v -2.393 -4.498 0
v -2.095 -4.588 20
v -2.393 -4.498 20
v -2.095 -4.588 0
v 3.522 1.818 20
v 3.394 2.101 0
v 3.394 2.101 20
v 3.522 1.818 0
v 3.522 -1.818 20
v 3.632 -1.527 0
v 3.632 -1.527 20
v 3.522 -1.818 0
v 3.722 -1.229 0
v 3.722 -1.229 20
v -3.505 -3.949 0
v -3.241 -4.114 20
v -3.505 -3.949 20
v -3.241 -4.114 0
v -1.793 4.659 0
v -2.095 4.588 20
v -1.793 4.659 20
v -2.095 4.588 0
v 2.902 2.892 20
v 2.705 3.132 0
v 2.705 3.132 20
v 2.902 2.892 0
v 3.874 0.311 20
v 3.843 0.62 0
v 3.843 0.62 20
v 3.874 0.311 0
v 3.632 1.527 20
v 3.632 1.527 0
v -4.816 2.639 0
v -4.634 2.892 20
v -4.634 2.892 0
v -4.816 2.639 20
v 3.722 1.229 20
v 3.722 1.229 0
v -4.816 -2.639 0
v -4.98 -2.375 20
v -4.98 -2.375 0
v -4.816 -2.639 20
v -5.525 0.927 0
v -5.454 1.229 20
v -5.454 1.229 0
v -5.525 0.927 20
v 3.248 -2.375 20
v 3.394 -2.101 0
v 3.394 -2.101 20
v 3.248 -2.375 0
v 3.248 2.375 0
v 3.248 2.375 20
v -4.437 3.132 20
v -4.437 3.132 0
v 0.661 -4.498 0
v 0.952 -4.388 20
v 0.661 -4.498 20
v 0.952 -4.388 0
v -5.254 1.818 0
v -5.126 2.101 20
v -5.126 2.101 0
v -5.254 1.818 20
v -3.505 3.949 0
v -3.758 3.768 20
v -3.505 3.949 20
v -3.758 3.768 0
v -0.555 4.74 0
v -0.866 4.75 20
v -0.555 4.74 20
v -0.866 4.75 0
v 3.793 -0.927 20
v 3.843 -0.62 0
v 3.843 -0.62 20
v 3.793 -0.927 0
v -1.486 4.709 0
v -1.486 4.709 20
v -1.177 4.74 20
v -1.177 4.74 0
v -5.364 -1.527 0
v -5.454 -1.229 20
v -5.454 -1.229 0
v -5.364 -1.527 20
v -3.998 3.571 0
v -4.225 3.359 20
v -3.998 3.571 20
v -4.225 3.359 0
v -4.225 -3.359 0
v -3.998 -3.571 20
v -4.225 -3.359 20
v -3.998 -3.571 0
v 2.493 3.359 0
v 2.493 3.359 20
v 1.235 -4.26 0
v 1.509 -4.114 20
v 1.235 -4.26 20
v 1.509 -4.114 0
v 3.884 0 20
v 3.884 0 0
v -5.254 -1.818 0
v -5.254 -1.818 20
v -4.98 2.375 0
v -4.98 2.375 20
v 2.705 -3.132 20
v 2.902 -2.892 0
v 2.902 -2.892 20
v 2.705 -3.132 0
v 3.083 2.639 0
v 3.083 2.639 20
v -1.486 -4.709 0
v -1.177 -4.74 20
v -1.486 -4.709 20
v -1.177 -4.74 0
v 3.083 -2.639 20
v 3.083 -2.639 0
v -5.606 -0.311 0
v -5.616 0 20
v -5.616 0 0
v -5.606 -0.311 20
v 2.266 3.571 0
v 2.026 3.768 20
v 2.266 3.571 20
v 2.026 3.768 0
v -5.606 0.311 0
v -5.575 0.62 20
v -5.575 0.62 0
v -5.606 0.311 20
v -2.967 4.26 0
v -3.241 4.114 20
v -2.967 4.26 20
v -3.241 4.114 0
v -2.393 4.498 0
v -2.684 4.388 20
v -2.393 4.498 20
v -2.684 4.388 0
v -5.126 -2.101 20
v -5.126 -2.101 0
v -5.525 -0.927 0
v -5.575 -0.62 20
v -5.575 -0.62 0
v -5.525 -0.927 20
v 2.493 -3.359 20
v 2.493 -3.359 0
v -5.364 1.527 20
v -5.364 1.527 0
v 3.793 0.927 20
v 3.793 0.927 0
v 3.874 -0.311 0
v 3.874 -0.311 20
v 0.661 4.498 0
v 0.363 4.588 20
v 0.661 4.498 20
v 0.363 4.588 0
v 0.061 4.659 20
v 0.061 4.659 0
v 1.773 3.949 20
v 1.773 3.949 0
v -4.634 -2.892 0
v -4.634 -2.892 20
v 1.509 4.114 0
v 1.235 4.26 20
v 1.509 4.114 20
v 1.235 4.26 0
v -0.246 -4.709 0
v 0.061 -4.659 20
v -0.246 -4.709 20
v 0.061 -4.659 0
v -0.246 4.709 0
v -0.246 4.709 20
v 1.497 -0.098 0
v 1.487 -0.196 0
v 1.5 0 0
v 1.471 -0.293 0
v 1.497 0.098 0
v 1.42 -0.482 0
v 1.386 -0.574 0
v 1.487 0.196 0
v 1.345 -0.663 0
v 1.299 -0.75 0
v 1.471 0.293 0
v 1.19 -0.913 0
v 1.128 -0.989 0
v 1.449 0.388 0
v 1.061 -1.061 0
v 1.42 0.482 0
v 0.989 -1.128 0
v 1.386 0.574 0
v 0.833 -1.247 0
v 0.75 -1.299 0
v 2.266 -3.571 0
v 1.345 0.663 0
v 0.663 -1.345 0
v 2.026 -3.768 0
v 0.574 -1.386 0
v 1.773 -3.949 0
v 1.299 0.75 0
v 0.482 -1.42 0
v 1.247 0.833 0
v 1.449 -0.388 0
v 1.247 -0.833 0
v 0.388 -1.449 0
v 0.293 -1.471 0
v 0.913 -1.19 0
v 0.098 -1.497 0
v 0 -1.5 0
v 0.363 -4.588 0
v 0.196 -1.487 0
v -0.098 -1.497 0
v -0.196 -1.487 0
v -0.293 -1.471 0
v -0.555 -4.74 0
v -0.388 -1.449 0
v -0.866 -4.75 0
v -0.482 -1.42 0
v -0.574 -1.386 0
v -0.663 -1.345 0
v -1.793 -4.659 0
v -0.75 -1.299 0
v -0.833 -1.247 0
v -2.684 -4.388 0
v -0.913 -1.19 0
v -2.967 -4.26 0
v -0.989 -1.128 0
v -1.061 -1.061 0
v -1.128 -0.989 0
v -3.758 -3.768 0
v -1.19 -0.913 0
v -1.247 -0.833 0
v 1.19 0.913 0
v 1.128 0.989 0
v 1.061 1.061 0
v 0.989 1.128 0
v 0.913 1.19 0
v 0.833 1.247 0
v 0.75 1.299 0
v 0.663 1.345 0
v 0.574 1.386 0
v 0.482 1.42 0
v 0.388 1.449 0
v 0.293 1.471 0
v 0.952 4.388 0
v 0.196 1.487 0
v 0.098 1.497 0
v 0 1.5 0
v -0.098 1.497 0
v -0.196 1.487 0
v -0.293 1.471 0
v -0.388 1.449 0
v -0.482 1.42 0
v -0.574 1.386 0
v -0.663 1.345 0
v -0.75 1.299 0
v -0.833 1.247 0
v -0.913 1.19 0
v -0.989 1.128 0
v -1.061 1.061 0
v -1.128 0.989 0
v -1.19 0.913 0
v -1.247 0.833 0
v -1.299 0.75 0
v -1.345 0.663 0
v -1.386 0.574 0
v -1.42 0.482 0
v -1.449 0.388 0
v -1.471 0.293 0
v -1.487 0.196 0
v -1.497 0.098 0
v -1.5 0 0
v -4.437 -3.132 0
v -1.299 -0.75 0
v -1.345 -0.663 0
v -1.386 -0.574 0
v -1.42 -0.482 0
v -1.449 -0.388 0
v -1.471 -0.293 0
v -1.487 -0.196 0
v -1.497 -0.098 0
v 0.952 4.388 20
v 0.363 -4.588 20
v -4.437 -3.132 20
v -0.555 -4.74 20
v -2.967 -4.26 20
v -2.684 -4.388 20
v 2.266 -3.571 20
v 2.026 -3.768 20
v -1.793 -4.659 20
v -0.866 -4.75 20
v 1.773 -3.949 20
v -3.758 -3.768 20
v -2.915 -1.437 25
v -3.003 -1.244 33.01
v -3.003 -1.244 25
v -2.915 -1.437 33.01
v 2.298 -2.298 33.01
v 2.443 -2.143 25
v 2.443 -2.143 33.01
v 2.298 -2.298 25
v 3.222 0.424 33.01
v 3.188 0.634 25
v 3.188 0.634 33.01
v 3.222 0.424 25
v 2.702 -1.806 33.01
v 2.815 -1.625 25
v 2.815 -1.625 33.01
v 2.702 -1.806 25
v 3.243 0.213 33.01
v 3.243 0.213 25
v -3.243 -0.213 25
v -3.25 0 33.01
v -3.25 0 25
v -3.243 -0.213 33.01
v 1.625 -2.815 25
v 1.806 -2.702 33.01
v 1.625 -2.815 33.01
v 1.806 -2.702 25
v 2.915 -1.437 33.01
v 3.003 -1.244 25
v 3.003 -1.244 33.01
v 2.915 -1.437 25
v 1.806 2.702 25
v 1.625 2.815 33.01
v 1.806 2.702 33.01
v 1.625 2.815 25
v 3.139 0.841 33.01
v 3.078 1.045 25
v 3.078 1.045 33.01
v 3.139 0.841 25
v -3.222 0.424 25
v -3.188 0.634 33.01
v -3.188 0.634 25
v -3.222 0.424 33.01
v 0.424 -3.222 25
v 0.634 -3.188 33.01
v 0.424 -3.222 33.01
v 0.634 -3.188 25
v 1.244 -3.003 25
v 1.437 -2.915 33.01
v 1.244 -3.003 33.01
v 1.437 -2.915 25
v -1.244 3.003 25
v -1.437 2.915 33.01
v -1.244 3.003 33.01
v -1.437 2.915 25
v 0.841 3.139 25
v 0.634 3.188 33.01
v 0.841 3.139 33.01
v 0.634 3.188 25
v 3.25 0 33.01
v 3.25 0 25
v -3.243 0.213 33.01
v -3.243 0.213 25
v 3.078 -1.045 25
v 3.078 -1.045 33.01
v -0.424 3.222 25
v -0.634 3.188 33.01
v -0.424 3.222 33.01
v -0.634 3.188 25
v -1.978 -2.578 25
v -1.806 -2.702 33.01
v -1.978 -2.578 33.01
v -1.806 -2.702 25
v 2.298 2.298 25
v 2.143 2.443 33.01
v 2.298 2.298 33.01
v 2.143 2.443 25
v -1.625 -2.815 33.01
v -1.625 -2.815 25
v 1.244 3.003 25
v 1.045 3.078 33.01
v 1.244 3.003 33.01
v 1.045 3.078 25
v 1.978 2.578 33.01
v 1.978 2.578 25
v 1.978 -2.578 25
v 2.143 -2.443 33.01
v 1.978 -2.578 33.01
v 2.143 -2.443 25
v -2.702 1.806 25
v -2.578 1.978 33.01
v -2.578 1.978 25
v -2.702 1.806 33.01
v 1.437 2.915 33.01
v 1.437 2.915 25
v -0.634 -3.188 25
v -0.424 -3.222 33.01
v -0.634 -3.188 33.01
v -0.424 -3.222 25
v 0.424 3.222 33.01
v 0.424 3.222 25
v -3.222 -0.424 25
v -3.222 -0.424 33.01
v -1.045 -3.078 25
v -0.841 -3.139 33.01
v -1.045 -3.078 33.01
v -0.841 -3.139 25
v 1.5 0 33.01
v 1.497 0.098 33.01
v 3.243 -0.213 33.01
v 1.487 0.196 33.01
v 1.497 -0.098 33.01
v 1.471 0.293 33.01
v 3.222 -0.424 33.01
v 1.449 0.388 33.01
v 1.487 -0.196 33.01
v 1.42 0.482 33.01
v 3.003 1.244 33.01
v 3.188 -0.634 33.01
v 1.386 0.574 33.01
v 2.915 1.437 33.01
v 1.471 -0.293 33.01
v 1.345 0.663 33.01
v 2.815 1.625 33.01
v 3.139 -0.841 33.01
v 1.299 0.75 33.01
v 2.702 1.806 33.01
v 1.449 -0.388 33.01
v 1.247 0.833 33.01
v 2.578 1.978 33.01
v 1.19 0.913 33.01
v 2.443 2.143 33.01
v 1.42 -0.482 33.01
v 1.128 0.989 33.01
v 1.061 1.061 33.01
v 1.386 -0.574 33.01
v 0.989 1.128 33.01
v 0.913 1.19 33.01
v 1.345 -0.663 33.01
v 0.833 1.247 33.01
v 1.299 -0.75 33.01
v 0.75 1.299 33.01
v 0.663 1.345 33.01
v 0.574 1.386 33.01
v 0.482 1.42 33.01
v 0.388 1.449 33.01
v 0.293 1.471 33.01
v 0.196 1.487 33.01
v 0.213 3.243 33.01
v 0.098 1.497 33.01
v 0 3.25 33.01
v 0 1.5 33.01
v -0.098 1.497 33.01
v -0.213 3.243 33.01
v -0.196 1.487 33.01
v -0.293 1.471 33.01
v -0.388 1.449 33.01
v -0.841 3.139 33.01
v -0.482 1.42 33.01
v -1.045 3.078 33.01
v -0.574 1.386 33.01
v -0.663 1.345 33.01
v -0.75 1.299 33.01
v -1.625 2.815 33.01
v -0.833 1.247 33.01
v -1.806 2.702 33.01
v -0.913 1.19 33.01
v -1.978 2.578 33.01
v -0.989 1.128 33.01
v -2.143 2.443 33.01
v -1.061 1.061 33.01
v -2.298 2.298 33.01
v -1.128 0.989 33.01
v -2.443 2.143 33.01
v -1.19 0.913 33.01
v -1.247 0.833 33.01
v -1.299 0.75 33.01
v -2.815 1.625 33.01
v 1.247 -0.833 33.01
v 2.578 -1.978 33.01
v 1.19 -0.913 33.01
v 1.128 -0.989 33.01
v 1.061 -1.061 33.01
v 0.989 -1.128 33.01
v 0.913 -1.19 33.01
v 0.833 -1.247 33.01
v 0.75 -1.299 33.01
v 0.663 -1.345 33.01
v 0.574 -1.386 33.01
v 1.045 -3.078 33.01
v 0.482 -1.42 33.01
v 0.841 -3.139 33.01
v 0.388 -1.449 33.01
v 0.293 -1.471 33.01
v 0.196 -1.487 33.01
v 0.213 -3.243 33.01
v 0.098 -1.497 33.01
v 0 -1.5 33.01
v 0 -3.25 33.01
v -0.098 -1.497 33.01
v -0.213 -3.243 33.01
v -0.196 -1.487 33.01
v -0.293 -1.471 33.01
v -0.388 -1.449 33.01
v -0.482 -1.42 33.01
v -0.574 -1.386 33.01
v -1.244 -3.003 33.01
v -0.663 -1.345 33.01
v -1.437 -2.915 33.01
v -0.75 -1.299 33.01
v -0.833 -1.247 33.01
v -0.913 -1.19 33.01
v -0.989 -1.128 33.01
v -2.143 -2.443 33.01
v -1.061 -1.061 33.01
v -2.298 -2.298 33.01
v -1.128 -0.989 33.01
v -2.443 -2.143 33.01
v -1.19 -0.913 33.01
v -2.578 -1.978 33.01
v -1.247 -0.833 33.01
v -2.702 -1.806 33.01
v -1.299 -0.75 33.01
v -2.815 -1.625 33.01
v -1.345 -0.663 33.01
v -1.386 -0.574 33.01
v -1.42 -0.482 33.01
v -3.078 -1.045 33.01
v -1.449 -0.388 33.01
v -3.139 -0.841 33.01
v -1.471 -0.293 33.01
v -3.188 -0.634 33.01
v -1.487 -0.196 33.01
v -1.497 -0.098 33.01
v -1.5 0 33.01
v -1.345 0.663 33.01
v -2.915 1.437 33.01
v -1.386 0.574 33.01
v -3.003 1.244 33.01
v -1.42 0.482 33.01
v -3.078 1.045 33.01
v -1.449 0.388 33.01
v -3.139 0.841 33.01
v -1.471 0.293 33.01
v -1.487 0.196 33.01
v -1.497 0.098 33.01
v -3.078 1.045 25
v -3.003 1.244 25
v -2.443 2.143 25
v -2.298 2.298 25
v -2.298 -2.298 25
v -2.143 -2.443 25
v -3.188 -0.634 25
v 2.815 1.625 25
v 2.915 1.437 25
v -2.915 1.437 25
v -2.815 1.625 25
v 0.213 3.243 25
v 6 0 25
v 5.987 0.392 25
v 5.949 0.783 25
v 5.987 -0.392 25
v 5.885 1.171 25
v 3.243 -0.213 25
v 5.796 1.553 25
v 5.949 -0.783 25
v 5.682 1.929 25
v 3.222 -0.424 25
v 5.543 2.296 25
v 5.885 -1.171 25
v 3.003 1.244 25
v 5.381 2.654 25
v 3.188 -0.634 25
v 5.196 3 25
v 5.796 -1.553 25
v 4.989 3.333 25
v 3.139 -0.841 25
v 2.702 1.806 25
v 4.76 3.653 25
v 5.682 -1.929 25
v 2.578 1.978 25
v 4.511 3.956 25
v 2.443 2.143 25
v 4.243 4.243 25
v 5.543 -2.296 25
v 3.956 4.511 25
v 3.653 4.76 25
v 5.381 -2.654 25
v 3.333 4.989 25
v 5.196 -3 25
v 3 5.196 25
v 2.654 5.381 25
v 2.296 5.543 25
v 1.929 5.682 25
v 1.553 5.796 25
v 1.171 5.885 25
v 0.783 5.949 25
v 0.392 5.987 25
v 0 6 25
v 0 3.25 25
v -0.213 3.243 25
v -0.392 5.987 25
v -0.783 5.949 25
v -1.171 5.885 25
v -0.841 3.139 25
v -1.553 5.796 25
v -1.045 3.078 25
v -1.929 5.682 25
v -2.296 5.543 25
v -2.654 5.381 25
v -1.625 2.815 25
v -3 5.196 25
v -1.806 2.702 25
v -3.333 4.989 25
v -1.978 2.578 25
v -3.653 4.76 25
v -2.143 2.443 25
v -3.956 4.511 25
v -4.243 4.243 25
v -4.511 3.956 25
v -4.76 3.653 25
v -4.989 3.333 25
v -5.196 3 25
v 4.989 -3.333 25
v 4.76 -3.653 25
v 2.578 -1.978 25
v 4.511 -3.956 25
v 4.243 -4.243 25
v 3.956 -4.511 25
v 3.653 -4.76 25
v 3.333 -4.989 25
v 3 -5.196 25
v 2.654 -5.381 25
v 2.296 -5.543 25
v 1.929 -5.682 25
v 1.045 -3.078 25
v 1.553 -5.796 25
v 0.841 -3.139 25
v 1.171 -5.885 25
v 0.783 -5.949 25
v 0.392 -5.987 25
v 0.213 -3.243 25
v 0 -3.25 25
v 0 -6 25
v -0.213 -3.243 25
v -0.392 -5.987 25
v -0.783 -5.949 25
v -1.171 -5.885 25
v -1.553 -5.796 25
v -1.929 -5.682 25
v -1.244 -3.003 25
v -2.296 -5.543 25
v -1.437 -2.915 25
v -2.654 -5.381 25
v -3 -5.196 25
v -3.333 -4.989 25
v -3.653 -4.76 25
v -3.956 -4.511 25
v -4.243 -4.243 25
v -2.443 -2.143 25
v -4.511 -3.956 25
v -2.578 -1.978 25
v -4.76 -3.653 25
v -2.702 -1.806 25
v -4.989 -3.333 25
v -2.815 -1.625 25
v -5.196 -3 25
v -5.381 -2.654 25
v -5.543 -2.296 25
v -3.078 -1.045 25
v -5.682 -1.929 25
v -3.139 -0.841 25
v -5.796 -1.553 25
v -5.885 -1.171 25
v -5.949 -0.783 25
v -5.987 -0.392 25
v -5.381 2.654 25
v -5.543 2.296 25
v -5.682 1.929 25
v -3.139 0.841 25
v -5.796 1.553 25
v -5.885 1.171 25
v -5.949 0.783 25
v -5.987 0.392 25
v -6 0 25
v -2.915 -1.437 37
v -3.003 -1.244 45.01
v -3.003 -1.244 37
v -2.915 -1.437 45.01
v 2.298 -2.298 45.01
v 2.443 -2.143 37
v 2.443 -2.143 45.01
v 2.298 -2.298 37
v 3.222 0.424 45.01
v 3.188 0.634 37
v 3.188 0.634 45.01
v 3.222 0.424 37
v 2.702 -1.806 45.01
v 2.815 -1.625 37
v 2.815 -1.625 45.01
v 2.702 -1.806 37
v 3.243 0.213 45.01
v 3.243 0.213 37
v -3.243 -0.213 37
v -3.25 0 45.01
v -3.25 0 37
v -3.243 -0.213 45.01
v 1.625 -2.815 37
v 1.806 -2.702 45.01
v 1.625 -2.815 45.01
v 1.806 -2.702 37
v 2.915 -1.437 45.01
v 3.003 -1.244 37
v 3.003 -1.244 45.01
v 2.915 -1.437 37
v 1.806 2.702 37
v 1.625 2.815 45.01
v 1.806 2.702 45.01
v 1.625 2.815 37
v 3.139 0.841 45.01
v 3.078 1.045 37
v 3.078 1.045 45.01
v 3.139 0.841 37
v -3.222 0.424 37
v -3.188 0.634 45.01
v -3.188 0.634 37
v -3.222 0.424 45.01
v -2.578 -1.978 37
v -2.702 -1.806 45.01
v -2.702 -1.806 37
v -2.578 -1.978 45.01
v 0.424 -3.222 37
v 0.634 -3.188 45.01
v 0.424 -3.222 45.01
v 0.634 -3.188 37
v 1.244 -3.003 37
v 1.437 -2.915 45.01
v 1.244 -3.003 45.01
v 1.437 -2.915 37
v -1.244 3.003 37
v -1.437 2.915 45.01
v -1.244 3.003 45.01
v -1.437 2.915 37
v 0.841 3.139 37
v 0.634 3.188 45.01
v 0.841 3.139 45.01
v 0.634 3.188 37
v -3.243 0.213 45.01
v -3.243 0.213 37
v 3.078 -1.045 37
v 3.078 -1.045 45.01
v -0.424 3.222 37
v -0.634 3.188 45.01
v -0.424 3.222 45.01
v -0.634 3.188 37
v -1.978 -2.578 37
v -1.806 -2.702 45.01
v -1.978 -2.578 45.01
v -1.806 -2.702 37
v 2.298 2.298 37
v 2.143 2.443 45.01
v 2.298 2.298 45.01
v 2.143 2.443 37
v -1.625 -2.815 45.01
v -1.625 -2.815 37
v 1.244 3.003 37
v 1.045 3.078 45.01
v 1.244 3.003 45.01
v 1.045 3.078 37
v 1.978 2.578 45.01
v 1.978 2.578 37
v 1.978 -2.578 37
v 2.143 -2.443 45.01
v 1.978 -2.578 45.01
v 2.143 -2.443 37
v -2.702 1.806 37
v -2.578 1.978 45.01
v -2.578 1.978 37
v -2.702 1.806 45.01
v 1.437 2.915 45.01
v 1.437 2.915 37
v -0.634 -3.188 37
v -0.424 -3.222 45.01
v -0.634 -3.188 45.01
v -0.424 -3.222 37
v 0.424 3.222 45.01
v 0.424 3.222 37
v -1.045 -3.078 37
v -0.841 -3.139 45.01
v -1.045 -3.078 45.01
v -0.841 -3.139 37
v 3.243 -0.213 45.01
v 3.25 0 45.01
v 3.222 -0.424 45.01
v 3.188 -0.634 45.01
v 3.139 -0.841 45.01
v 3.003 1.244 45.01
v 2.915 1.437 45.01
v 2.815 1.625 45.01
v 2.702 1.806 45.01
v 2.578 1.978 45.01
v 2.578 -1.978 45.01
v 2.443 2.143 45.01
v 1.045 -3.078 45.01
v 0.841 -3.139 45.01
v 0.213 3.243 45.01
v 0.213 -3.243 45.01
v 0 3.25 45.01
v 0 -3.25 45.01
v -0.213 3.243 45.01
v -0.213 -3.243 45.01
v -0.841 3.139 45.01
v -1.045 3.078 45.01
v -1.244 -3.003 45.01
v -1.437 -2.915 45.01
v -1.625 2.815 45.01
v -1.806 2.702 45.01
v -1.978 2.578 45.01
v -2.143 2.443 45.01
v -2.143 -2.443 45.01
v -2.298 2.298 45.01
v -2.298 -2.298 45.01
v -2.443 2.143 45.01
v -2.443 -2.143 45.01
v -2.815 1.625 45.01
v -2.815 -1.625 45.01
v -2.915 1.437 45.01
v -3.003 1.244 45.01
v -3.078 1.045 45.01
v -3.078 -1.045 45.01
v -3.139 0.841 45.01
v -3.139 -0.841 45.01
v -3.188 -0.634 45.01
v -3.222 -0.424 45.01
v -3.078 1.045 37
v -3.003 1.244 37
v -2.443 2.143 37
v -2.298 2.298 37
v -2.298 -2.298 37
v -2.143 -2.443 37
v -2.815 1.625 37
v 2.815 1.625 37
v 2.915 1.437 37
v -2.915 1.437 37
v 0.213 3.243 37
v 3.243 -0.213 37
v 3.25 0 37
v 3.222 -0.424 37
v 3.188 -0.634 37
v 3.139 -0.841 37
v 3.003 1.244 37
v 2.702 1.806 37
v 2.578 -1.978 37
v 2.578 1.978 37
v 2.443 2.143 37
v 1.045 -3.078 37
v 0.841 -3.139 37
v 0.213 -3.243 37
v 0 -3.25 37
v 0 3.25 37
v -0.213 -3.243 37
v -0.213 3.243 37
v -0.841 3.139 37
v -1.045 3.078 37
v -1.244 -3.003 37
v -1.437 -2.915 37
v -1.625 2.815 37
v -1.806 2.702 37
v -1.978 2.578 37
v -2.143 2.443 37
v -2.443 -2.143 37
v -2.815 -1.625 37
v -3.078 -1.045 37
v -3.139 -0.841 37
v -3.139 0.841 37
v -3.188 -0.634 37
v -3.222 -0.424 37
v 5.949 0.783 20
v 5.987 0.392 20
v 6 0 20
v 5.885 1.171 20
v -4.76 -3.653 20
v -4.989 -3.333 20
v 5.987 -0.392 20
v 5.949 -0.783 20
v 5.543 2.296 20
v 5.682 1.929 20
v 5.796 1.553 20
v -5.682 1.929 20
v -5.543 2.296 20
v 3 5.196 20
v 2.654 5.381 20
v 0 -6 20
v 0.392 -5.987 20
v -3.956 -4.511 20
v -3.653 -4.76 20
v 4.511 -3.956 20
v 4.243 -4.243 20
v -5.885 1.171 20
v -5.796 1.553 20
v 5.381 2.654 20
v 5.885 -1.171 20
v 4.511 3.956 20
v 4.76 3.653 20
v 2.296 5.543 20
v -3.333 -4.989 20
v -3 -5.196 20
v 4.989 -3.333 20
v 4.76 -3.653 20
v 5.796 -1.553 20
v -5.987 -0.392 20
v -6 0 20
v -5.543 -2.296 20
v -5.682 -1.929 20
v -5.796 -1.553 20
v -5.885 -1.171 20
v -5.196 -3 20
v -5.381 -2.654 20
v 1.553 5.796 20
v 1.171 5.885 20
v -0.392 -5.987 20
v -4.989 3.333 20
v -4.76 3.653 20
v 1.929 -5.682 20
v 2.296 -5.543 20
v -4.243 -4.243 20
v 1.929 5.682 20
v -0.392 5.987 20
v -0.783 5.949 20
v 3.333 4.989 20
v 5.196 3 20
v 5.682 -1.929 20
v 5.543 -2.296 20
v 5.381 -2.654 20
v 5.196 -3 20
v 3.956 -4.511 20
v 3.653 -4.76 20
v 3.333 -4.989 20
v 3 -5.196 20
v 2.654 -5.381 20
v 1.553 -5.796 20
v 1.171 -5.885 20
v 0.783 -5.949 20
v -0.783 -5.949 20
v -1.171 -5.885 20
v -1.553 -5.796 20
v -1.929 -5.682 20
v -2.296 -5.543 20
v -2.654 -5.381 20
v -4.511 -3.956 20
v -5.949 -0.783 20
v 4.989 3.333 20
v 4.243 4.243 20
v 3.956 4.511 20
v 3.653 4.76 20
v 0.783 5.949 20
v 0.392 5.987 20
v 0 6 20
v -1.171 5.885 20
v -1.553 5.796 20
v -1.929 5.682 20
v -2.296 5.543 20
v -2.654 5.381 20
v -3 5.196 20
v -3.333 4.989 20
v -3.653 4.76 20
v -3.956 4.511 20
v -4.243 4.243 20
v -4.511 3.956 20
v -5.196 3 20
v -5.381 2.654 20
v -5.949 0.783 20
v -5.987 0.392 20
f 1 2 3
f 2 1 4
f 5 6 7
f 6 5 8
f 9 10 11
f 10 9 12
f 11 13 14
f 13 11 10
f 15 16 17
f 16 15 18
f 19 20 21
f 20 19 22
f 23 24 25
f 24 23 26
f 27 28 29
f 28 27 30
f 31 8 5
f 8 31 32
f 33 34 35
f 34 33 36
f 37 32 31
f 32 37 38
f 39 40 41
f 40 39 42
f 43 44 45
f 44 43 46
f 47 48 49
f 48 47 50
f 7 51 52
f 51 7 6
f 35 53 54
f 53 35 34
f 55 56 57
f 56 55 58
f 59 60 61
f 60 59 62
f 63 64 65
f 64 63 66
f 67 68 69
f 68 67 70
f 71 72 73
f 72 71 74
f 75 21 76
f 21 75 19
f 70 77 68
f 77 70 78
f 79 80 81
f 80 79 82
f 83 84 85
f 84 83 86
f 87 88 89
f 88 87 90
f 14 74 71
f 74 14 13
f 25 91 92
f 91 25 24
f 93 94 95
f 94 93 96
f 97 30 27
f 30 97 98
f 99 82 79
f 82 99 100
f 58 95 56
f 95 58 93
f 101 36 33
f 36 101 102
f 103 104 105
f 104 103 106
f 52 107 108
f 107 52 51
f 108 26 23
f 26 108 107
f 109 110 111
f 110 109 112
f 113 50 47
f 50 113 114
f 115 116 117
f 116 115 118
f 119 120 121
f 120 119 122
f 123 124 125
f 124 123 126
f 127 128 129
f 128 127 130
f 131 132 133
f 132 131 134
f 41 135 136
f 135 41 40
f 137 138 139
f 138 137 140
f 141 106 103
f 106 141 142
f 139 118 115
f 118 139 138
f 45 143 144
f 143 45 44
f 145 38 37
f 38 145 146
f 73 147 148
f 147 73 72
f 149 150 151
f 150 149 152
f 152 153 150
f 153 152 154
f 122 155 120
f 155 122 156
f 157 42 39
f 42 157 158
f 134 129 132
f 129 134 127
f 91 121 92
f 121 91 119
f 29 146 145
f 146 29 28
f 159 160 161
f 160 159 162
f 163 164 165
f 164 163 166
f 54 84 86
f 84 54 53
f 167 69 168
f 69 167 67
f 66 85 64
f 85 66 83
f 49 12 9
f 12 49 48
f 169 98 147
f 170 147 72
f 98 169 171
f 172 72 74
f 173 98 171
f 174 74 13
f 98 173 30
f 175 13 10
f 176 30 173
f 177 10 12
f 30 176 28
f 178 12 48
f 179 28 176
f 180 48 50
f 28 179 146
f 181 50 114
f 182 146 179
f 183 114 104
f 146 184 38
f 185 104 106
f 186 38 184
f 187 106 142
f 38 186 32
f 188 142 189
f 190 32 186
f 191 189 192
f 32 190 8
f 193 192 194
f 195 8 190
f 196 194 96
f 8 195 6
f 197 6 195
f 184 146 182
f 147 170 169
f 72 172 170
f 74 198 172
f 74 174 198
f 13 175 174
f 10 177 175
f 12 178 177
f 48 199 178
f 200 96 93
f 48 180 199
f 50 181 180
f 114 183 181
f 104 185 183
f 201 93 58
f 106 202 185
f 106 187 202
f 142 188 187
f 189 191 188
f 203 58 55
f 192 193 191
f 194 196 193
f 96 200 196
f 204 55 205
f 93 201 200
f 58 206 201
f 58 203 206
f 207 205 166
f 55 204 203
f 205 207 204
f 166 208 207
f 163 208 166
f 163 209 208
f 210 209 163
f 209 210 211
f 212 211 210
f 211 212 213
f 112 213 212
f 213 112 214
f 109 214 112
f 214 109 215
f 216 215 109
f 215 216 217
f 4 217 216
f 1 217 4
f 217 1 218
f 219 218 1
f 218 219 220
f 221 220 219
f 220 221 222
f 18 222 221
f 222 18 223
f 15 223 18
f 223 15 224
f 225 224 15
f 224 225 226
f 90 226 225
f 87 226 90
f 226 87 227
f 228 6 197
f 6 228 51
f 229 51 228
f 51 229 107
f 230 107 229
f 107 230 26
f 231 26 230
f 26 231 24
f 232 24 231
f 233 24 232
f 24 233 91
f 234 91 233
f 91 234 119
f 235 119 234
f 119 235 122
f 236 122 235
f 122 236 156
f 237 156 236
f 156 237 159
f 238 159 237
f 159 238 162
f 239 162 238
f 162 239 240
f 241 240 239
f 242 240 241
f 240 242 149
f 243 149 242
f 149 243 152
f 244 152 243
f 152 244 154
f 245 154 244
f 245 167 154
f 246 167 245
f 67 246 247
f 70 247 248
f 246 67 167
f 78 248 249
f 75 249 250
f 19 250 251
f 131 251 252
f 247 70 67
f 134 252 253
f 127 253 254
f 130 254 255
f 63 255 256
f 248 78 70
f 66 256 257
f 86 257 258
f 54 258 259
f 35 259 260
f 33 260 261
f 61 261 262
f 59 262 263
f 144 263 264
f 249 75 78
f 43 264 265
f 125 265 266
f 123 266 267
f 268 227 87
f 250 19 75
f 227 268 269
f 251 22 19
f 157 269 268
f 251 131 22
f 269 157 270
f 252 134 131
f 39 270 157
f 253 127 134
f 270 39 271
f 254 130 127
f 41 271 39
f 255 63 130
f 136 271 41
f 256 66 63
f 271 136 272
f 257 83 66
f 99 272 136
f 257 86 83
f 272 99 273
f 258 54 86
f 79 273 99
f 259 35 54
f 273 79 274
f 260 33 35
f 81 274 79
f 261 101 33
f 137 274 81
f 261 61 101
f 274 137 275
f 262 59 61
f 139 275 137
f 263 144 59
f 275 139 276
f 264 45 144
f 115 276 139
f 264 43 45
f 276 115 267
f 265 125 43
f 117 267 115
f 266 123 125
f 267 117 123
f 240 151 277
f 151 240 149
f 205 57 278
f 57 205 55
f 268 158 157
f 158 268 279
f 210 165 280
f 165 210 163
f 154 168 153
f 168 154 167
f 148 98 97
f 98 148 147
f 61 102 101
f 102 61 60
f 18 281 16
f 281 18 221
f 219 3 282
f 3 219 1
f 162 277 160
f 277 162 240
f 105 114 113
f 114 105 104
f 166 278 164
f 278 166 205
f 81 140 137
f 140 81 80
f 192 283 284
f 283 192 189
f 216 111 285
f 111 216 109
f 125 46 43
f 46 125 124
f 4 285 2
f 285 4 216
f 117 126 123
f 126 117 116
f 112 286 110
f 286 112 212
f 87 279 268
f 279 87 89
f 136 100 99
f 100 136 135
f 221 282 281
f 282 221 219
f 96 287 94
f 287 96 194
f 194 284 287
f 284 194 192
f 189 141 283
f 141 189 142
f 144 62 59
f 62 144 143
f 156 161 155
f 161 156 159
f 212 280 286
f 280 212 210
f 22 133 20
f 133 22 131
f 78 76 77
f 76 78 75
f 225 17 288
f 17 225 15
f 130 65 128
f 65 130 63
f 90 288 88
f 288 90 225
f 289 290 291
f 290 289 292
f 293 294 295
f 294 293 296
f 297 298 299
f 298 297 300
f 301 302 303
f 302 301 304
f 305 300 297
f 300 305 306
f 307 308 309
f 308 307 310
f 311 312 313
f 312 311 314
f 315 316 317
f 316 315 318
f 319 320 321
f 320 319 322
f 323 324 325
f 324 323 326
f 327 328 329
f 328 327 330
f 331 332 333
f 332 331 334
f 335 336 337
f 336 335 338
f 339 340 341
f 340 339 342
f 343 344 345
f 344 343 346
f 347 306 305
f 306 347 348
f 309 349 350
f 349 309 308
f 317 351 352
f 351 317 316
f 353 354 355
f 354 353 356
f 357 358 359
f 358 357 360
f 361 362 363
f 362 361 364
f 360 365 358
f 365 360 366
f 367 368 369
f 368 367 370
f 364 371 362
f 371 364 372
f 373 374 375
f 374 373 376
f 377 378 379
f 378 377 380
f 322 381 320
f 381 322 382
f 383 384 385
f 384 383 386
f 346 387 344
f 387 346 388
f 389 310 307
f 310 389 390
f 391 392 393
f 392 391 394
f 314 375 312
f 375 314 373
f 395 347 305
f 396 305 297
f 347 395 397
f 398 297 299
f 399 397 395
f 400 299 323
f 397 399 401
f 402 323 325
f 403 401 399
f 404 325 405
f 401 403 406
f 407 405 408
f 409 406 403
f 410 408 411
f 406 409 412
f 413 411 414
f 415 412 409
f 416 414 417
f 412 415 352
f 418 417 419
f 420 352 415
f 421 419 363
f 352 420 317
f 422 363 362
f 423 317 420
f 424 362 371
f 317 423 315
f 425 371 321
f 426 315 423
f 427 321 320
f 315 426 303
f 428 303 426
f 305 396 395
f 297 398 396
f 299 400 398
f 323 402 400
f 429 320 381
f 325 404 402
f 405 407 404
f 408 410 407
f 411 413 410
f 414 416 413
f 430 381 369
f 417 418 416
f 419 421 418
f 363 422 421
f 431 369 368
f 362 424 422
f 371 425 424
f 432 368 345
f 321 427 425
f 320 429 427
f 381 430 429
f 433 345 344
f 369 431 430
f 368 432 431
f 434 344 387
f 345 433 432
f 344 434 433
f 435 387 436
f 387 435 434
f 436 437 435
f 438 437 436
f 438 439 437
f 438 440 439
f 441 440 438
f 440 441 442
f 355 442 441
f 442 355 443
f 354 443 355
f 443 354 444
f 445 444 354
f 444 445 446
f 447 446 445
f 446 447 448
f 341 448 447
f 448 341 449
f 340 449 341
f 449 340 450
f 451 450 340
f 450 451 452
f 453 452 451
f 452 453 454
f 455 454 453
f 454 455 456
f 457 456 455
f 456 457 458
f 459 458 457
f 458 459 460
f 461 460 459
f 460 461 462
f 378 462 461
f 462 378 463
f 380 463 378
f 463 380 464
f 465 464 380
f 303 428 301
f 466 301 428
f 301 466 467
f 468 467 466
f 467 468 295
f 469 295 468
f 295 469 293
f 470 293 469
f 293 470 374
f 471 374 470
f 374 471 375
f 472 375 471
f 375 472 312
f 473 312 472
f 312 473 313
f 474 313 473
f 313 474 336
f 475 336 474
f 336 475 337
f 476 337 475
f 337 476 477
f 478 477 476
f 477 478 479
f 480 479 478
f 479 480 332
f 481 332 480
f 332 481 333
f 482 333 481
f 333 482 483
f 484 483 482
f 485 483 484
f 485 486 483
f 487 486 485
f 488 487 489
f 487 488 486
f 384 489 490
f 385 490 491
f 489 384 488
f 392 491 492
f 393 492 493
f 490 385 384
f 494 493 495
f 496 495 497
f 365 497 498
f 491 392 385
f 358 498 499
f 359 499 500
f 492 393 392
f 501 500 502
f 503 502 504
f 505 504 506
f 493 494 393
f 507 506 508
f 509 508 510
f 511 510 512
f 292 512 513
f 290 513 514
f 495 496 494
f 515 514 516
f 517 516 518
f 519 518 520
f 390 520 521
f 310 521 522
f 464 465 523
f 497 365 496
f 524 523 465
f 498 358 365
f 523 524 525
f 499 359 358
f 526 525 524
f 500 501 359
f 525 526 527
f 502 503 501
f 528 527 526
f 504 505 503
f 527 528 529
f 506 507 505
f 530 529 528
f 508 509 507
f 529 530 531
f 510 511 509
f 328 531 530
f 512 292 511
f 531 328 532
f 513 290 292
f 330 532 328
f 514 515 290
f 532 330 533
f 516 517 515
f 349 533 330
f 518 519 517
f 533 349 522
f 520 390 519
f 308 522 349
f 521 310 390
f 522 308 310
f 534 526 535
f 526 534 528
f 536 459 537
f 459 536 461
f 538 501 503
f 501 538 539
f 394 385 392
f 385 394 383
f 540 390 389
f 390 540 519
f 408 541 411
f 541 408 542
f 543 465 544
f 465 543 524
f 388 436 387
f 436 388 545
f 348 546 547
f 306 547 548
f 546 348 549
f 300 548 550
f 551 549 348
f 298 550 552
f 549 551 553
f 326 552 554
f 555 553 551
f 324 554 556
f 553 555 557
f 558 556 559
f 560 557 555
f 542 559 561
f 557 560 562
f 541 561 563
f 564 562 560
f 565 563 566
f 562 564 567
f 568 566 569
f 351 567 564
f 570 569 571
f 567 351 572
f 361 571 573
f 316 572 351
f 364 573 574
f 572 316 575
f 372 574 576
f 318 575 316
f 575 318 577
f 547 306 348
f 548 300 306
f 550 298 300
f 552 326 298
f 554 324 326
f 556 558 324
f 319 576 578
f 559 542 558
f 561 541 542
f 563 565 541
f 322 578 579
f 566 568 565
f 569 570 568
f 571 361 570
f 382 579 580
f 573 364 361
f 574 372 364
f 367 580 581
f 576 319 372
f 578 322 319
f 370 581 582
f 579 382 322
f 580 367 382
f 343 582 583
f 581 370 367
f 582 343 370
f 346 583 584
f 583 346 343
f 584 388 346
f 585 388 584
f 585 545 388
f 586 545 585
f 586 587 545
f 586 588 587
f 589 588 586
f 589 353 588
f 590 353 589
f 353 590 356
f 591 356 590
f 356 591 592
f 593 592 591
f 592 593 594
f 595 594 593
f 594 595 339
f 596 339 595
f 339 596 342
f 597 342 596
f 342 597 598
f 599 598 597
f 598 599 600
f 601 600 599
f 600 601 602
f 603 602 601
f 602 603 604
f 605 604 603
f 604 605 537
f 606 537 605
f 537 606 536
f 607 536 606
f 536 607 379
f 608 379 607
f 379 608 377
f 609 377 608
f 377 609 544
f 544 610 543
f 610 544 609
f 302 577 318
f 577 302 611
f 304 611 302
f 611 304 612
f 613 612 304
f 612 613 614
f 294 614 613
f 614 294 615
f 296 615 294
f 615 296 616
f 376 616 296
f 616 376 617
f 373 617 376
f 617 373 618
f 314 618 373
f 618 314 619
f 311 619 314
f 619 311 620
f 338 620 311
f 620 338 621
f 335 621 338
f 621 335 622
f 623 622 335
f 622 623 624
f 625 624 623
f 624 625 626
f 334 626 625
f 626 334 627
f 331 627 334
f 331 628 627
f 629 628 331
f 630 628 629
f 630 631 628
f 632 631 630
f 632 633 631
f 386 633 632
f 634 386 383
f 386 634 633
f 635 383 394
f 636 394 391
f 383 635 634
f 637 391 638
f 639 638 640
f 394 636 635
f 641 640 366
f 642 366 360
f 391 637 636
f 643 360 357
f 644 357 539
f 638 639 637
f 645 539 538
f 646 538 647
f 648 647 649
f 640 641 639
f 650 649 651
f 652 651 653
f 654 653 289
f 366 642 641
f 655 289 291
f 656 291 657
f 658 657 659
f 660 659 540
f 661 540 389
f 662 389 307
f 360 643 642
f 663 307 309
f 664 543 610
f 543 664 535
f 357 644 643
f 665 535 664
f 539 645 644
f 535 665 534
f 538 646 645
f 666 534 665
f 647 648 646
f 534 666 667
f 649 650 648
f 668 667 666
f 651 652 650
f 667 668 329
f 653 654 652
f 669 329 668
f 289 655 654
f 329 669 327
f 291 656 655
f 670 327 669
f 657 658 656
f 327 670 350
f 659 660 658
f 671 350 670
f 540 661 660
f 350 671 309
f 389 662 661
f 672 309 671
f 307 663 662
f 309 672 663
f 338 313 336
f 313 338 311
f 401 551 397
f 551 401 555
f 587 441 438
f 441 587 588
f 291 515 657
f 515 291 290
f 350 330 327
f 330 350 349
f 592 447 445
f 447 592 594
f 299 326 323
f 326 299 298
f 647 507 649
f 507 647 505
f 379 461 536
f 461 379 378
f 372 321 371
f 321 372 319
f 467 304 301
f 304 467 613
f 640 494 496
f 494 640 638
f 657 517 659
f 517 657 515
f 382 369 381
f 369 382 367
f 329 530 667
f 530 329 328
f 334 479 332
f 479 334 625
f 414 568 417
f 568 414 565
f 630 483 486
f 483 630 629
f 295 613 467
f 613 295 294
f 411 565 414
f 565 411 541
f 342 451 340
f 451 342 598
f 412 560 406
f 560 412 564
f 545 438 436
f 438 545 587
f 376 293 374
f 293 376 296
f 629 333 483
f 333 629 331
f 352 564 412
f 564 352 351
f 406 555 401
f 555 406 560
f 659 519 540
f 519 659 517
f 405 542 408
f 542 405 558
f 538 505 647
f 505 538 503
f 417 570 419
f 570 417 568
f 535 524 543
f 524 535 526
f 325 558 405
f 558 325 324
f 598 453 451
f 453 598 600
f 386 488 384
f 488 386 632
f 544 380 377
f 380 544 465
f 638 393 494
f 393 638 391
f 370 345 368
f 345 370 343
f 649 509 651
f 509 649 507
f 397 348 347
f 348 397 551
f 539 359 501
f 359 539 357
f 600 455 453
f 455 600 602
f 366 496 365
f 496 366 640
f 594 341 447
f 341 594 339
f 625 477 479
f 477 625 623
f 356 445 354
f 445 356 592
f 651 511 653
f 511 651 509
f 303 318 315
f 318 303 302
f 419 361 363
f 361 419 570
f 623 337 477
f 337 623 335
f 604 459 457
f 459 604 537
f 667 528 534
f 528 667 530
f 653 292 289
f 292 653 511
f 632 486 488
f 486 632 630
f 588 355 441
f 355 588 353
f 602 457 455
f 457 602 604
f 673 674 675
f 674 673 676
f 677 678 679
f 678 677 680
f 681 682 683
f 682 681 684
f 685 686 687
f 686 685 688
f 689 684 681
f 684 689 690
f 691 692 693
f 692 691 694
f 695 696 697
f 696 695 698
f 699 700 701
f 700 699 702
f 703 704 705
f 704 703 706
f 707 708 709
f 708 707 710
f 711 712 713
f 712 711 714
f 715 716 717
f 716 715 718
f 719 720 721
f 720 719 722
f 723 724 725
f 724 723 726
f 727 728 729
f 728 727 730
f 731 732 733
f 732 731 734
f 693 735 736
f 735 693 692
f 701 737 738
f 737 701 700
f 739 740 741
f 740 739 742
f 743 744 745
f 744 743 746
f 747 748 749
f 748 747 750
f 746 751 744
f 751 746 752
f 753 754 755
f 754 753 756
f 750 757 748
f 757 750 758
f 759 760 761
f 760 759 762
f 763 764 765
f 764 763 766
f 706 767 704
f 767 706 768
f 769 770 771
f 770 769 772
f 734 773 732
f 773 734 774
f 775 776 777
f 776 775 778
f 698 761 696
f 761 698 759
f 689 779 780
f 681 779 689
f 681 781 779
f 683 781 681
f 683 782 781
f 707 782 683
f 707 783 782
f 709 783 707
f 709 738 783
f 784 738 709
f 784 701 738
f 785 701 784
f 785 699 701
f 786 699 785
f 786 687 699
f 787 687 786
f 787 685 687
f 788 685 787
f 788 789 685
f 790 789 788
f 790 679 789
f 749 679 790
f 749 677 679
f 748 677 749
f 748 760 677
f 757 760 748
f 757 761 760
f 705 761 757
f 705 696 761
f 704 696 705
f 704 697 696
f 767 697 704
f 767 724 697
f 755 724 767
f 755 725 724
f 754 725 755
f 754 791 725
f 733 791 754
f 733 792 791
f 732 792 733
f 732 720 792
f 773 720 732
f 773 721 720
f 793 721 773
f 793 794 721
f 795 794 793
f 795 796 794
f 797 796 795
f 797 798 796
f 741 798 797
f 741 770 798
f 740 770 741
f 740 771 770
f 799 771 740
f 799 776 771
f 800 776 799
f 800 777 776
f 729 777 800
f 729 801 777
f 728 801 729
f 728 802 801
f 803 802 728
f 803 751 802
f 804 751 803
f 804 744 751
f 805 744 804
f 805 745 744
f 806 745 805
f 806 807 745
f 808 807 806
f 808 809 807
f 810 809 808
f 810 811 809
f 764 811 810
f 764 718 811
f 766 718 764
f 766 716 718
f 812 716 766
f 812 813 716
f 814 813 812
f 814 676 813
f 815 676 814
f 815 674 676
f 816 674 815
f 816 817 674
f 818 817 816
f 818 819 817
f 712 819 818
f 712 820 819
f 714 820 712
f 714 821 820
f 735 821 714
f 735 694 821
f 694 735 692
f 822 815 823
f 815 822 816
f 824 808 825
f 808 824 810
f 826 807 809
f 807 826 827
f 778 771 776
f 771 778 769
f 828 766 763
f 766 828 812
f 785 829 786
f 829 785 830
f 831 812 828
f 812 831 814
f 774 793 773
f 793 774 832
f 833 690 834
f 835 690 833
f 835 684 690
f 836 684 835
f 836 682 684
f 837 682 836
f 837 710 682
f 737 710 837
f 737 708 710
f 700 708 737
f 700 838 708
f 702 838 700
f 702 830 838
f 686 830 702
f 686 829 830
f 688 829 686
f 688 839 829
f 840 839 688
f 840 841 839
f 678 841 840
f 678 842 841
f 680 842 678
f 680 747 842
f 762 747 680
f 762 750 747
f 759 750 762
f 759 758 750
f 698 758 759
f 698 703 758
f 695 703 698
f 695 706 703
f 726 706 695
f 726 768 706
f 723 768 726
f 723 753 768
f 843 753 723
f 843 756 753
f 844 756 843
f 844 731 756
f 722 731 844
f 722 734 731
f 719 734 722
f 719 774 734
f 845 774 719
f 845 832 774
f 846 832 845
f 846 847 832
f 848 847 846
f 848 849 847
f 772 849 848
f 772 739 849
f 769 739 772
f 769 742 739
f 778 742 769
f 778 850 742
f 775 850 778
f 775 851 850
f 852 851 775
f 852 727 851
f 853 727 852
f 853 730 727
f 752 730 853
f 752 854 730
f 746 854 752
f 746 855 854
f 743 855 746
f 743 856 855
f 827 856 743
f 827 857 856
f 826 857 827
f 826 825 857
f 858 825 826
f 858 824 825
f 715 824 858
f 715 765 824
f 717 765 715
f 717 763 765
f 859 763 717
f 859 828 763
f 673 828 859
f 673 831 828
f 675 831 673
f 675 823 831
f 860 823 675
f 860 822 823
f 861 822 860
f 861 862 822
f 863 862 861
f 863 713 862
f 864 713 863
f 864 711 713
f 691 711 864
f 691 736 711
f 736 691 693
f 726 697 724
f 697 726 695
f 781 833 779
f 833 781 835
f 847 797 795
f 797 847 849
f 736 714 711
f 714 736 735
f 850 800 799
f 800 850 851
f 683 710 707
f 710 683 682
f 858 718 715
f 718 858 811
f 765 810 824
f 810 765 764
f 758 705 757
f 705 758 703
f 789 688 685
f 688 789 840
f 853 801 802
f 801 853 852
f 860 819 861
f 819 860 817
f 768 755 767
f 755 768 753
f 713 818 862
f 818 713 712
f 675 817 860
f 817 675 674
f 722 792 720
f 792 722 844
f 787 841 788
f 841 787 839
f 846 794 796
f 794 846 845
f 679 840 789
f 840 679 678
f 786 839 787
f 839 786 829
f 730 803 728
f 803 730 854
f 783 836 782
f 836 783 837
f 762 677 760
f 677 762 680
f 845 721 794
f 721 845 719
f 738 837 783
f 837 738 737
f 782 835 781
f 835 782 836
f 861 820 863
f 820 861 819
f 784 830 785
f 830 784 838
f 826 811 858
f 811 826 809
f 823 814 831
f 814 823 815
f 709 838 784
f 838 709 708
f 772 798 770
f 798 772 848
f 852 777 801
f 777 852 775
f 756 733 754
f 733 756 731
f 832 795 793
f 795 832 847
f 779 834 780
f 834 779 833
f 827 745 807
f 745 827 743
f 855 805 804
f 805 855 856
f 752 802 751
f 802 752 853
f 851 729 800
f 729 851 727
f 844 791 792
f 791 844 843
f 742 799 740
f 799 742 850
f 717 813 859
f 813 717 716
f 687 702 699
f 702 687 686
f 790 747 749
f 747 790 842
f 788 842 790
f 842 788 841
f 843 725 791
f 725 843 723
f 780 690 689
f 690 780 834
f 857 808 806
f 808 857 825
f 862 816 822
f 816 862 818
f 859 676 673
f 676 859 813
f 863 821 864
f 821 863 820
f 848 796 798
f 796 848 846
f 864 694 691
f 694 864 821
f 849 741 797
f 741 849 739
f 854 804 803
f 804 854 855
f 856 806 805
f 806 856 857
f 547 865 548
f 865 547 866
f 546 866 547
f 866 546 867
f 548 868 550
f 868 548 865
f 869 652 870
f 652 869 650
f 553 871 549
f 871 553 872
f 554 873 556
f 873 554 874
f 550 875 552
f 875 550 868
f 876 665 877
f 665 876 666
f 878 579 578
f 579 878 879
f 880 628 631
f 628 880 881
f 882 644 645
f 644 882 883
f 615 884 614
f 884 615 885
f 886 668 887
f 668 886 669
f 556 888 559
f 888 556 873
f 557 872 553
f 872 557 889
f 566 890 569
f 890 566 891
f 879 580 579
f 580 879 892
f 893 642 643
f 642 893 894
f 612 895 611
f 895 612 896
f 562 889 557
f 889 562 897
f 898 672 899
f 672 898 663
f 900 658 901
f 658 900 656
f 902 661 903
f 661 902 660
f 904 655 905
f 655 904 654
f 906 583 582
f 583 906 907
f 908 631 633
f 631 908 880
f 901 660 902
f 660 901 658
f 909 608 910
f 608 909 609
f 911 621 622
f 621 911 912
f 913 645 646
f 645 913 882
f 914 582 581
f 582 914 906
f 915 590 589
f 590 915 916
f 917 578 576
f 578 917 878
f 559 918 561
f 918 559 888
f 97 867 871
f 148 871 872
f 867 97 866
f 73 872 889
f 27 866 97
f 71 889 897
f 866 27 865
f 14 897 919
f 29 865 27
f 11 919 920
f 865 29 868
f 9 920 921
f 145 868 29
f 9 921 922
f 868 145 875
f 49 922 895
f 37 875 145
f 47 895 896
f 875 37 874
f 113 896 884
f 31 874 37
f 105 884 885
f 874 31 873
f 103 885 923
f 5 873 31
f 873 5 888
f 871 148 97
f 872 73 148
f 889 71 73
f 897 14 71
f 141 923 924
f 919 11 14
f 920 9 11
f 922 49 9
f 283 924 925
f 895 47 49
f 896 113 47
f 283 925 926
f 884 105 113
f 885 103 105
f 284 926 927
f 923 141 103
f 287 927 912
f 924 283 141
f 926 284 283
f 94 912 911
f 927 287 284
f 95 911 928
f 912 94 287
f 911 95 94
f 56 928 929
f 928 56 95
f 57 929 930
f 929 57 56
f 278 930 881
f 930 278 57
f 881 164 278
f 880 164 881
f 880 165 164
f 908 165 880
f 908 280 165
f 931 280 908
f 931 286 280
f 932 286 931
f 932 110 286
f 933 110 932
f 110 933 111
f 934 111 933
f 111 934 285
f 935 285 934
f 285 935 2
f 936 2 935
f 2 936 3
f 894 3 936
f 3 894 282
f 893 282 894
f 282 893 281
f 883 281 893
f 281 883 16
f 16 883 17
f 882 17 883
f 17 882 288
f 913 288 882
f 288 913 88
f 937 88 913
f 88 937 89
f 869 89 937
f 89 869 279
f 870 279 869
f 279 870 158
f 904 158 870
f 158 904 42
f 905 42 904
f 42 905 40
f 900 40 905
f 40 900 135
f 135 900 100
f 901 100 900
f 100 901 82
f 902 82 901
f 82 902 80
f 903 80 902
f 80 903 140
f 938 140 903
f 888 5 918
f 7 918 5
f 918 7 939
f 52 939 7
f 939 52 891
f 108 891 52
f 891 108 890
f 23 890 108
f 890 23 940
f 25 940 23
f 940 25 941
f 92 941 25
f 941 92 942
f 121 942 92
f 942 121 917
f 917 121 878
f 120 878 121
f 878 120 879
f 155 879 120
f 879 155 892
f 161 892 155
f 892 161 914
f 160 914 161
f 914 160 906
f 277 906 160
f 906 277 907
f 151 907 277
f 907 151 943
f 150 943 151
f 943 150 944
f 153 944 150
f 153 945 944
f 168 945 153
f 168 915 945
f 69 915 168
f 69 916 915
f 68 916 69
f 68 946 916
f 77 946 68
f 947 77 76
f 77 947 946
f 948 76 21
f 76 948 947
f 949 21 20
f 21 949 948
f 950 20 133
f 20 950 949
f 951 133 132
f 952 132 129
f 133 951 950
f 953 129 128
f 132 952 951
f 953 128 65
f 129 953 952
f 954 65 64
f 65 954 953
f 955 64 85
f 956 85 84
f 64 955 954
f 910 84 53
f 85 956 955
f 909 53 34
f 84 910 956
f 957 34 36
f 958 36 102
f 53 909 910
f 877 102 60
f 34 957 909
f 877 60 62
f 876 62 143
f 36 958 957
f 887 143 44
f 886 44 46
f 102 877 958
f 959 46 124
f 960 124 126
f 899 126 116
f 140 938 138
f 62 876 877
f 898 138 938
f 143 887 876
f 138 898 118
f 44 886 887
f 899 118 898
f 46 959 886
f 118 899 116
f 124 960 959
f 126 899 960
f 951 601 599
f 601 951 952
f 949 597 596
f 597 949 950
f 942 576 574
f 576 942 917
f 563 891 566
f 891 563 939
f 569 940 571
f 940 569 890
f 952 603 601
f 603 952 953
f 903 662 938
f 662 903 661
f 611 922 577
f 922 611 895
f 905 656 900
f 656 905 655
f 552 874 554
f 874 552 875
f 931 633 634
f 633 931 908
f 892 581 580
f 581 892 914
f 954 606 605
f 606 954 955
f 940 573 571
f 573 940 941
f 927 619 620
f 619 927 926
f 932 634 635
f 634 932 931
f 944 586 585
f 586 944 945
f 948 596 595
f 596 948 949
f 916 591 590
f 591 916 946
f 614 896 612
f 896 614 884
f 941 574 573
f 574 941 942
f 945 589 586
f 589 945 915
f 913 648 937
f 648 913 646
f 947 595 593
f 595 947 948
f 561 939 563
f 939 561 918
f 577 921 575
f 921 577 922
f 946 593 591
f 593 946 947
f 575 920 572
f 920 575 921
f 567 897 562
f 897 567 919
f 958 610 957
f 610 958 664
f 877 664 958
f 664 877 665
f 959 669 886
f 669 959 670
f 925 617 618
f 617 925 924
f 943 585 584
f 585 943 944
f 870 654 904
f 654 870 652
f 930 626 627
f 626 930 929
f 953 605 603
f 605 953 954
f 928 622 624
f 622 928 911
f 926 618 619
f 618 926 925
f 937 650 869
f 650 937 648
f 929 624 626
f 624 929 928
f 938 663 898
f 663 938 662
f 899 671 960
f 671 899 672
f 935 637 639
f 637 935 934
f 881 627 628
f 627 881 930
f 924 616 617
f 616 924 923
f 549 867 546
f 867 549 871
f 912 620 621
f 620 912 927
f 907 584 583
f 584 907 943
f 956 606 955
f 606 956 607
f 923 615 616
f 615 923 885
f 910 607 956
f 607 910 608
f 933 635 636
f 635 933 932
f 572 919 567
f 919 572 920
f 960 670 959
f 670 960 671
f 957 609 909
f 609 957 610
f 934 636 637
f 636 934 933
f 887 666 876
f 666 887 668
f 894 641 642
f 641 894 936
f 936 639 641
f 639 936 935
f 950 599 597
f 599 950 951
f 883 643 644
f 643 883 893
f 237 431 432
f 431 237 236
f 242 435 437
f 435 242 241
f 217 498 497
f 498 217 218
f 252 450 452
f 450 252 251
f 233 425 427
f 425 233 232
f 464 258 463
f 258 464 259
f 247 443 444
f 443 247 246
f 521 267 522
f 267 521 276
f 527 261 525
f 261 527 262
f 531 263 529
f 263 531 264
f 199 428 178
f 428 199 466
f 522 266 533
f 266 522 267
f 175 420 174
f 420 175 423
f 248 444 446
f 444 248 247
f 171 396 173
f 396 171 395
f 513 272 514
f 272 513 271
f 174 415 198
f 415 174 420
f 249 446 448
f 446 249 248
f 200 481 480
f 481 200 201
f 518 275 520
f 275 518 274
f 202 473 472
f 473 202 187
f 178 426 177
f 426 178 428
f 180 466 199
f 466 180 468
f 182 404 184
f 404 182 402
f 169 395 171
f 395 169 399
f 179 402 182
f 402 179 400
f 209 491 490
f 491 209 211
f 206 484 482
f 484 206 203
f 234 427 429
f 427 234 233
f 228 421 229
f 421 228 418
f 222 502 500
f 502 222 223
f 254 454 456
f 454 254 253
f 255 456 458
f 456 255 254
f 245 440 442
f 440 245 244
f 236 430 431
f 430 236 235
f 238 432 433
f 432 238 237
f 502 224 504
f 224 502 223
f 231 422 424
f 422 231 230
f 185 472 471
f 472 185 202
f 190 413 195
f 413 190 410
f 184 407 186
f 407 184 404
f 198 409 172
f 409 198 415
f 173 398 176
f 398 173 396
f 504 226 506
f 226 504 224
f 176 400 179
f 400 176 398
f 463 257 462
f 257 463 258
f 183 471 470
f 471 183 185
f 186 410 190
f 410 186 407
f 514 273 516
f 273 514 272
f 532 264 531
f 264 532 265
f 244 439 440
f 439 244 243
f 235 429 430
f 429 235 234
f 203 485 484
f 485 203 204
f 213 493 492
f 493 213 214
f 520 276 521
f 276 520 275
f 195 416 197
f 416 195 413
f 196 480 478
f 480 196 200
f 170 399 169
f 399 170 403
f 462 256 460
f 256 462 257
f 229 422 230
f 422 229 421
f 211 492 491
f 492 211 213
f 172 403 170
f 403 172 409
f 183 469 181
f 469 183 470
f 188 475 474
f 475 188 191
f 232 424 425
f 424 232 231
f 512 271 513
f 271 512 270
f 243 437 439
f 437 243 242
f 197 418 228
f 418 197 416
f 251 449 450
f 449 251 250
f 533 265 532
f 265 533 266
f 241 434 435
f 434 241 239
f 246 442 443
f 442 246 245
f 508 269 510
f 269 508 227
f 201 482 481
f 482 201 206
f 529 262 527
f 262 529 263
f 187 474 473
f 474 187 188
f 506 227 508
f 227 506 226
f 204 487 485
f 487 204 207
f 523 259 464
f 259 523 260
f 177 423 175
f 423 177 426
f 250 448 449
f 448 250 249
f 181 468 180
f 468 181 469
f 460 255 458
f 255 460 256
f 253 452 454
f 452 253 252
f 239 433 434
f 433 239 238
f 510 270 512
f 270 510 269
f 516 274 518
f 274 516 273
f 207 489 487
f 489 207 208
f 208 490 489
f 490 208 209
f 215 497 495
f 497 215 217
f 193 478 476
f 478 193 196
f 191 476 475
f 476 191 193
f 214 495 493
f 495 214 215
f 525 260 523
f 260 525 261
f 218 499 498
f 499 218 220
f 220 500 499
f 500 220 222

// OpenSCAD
// Hose-barb reducer: joins 8 mm ID tubing to 5 mm ID tubing
// Print orientation: standing upright along Z

$fn = 96;

// ---- 8 mm tubing barbs (z = 0 to 20) ----
barb_h_8 = 20;
barb_od_bottom_8 = 7.5;
barb_od_top_8 = 9.5;

// ---- 5 mm tubing barbs (z = 25 to 41) ----
barb_h_5 = 8;
barb_od_bottom_5 = 6.5;
barb_od_top_5 = 5.0;

// ---- Collar (z = 20 to 25) ----
collar_od = 12;

// ---- Through bore ----
bore = 3;

// ---- Derived ----
collar_h = 5;
overlap = 0.01;

module barb(h, od_bottom, od_top) {
    // Sawtooth profile: grow linearly, then step straight back to bottom diameter
    len = (od_top - od_bottom) / 2 / tan(30);  // 30 deg flank
    hull() {
        translate([0, 0, 0]) cylinder(h = h + overlap, d = od_bottom);
        translate([0, 0, h - overlap]) cylinder(h = overlap, d = od_bottom);
        for (s = [-1, 1])
            rotate([0, 0, s * 180])
                translate([len / 2, 0, 0])
                    linear_extrude(height = h + overlap)
                        circle(d = od_top);
    }
}

difference() {
    union() {
        // 8 mm barbs
        for (z = [0, barb_h_8 / 2])
            translate([0, 0, z]) barb(h = barb_h_8 / 2 + overlap, od_bottom = barb_od_bottom_8, od_top = barb_od_top_8);

        // Collar
        translate([0, 0, 20]) cylinder(h = collar_h, d = collar_od);

        // 5 mm barbs
        for (z = [25, 41 - 8 / 2])
            translate([0, 0, z]) barb(h = barb_h_5, od_bottom = barb_od_bottom_5, od_top = barb_od_top_5);
    }

    // Through bore
    translate([0, 0, -1]) cylinder(h = barb_h_8 + collar_h + barb_h_5 + 2, d = bore);
}
